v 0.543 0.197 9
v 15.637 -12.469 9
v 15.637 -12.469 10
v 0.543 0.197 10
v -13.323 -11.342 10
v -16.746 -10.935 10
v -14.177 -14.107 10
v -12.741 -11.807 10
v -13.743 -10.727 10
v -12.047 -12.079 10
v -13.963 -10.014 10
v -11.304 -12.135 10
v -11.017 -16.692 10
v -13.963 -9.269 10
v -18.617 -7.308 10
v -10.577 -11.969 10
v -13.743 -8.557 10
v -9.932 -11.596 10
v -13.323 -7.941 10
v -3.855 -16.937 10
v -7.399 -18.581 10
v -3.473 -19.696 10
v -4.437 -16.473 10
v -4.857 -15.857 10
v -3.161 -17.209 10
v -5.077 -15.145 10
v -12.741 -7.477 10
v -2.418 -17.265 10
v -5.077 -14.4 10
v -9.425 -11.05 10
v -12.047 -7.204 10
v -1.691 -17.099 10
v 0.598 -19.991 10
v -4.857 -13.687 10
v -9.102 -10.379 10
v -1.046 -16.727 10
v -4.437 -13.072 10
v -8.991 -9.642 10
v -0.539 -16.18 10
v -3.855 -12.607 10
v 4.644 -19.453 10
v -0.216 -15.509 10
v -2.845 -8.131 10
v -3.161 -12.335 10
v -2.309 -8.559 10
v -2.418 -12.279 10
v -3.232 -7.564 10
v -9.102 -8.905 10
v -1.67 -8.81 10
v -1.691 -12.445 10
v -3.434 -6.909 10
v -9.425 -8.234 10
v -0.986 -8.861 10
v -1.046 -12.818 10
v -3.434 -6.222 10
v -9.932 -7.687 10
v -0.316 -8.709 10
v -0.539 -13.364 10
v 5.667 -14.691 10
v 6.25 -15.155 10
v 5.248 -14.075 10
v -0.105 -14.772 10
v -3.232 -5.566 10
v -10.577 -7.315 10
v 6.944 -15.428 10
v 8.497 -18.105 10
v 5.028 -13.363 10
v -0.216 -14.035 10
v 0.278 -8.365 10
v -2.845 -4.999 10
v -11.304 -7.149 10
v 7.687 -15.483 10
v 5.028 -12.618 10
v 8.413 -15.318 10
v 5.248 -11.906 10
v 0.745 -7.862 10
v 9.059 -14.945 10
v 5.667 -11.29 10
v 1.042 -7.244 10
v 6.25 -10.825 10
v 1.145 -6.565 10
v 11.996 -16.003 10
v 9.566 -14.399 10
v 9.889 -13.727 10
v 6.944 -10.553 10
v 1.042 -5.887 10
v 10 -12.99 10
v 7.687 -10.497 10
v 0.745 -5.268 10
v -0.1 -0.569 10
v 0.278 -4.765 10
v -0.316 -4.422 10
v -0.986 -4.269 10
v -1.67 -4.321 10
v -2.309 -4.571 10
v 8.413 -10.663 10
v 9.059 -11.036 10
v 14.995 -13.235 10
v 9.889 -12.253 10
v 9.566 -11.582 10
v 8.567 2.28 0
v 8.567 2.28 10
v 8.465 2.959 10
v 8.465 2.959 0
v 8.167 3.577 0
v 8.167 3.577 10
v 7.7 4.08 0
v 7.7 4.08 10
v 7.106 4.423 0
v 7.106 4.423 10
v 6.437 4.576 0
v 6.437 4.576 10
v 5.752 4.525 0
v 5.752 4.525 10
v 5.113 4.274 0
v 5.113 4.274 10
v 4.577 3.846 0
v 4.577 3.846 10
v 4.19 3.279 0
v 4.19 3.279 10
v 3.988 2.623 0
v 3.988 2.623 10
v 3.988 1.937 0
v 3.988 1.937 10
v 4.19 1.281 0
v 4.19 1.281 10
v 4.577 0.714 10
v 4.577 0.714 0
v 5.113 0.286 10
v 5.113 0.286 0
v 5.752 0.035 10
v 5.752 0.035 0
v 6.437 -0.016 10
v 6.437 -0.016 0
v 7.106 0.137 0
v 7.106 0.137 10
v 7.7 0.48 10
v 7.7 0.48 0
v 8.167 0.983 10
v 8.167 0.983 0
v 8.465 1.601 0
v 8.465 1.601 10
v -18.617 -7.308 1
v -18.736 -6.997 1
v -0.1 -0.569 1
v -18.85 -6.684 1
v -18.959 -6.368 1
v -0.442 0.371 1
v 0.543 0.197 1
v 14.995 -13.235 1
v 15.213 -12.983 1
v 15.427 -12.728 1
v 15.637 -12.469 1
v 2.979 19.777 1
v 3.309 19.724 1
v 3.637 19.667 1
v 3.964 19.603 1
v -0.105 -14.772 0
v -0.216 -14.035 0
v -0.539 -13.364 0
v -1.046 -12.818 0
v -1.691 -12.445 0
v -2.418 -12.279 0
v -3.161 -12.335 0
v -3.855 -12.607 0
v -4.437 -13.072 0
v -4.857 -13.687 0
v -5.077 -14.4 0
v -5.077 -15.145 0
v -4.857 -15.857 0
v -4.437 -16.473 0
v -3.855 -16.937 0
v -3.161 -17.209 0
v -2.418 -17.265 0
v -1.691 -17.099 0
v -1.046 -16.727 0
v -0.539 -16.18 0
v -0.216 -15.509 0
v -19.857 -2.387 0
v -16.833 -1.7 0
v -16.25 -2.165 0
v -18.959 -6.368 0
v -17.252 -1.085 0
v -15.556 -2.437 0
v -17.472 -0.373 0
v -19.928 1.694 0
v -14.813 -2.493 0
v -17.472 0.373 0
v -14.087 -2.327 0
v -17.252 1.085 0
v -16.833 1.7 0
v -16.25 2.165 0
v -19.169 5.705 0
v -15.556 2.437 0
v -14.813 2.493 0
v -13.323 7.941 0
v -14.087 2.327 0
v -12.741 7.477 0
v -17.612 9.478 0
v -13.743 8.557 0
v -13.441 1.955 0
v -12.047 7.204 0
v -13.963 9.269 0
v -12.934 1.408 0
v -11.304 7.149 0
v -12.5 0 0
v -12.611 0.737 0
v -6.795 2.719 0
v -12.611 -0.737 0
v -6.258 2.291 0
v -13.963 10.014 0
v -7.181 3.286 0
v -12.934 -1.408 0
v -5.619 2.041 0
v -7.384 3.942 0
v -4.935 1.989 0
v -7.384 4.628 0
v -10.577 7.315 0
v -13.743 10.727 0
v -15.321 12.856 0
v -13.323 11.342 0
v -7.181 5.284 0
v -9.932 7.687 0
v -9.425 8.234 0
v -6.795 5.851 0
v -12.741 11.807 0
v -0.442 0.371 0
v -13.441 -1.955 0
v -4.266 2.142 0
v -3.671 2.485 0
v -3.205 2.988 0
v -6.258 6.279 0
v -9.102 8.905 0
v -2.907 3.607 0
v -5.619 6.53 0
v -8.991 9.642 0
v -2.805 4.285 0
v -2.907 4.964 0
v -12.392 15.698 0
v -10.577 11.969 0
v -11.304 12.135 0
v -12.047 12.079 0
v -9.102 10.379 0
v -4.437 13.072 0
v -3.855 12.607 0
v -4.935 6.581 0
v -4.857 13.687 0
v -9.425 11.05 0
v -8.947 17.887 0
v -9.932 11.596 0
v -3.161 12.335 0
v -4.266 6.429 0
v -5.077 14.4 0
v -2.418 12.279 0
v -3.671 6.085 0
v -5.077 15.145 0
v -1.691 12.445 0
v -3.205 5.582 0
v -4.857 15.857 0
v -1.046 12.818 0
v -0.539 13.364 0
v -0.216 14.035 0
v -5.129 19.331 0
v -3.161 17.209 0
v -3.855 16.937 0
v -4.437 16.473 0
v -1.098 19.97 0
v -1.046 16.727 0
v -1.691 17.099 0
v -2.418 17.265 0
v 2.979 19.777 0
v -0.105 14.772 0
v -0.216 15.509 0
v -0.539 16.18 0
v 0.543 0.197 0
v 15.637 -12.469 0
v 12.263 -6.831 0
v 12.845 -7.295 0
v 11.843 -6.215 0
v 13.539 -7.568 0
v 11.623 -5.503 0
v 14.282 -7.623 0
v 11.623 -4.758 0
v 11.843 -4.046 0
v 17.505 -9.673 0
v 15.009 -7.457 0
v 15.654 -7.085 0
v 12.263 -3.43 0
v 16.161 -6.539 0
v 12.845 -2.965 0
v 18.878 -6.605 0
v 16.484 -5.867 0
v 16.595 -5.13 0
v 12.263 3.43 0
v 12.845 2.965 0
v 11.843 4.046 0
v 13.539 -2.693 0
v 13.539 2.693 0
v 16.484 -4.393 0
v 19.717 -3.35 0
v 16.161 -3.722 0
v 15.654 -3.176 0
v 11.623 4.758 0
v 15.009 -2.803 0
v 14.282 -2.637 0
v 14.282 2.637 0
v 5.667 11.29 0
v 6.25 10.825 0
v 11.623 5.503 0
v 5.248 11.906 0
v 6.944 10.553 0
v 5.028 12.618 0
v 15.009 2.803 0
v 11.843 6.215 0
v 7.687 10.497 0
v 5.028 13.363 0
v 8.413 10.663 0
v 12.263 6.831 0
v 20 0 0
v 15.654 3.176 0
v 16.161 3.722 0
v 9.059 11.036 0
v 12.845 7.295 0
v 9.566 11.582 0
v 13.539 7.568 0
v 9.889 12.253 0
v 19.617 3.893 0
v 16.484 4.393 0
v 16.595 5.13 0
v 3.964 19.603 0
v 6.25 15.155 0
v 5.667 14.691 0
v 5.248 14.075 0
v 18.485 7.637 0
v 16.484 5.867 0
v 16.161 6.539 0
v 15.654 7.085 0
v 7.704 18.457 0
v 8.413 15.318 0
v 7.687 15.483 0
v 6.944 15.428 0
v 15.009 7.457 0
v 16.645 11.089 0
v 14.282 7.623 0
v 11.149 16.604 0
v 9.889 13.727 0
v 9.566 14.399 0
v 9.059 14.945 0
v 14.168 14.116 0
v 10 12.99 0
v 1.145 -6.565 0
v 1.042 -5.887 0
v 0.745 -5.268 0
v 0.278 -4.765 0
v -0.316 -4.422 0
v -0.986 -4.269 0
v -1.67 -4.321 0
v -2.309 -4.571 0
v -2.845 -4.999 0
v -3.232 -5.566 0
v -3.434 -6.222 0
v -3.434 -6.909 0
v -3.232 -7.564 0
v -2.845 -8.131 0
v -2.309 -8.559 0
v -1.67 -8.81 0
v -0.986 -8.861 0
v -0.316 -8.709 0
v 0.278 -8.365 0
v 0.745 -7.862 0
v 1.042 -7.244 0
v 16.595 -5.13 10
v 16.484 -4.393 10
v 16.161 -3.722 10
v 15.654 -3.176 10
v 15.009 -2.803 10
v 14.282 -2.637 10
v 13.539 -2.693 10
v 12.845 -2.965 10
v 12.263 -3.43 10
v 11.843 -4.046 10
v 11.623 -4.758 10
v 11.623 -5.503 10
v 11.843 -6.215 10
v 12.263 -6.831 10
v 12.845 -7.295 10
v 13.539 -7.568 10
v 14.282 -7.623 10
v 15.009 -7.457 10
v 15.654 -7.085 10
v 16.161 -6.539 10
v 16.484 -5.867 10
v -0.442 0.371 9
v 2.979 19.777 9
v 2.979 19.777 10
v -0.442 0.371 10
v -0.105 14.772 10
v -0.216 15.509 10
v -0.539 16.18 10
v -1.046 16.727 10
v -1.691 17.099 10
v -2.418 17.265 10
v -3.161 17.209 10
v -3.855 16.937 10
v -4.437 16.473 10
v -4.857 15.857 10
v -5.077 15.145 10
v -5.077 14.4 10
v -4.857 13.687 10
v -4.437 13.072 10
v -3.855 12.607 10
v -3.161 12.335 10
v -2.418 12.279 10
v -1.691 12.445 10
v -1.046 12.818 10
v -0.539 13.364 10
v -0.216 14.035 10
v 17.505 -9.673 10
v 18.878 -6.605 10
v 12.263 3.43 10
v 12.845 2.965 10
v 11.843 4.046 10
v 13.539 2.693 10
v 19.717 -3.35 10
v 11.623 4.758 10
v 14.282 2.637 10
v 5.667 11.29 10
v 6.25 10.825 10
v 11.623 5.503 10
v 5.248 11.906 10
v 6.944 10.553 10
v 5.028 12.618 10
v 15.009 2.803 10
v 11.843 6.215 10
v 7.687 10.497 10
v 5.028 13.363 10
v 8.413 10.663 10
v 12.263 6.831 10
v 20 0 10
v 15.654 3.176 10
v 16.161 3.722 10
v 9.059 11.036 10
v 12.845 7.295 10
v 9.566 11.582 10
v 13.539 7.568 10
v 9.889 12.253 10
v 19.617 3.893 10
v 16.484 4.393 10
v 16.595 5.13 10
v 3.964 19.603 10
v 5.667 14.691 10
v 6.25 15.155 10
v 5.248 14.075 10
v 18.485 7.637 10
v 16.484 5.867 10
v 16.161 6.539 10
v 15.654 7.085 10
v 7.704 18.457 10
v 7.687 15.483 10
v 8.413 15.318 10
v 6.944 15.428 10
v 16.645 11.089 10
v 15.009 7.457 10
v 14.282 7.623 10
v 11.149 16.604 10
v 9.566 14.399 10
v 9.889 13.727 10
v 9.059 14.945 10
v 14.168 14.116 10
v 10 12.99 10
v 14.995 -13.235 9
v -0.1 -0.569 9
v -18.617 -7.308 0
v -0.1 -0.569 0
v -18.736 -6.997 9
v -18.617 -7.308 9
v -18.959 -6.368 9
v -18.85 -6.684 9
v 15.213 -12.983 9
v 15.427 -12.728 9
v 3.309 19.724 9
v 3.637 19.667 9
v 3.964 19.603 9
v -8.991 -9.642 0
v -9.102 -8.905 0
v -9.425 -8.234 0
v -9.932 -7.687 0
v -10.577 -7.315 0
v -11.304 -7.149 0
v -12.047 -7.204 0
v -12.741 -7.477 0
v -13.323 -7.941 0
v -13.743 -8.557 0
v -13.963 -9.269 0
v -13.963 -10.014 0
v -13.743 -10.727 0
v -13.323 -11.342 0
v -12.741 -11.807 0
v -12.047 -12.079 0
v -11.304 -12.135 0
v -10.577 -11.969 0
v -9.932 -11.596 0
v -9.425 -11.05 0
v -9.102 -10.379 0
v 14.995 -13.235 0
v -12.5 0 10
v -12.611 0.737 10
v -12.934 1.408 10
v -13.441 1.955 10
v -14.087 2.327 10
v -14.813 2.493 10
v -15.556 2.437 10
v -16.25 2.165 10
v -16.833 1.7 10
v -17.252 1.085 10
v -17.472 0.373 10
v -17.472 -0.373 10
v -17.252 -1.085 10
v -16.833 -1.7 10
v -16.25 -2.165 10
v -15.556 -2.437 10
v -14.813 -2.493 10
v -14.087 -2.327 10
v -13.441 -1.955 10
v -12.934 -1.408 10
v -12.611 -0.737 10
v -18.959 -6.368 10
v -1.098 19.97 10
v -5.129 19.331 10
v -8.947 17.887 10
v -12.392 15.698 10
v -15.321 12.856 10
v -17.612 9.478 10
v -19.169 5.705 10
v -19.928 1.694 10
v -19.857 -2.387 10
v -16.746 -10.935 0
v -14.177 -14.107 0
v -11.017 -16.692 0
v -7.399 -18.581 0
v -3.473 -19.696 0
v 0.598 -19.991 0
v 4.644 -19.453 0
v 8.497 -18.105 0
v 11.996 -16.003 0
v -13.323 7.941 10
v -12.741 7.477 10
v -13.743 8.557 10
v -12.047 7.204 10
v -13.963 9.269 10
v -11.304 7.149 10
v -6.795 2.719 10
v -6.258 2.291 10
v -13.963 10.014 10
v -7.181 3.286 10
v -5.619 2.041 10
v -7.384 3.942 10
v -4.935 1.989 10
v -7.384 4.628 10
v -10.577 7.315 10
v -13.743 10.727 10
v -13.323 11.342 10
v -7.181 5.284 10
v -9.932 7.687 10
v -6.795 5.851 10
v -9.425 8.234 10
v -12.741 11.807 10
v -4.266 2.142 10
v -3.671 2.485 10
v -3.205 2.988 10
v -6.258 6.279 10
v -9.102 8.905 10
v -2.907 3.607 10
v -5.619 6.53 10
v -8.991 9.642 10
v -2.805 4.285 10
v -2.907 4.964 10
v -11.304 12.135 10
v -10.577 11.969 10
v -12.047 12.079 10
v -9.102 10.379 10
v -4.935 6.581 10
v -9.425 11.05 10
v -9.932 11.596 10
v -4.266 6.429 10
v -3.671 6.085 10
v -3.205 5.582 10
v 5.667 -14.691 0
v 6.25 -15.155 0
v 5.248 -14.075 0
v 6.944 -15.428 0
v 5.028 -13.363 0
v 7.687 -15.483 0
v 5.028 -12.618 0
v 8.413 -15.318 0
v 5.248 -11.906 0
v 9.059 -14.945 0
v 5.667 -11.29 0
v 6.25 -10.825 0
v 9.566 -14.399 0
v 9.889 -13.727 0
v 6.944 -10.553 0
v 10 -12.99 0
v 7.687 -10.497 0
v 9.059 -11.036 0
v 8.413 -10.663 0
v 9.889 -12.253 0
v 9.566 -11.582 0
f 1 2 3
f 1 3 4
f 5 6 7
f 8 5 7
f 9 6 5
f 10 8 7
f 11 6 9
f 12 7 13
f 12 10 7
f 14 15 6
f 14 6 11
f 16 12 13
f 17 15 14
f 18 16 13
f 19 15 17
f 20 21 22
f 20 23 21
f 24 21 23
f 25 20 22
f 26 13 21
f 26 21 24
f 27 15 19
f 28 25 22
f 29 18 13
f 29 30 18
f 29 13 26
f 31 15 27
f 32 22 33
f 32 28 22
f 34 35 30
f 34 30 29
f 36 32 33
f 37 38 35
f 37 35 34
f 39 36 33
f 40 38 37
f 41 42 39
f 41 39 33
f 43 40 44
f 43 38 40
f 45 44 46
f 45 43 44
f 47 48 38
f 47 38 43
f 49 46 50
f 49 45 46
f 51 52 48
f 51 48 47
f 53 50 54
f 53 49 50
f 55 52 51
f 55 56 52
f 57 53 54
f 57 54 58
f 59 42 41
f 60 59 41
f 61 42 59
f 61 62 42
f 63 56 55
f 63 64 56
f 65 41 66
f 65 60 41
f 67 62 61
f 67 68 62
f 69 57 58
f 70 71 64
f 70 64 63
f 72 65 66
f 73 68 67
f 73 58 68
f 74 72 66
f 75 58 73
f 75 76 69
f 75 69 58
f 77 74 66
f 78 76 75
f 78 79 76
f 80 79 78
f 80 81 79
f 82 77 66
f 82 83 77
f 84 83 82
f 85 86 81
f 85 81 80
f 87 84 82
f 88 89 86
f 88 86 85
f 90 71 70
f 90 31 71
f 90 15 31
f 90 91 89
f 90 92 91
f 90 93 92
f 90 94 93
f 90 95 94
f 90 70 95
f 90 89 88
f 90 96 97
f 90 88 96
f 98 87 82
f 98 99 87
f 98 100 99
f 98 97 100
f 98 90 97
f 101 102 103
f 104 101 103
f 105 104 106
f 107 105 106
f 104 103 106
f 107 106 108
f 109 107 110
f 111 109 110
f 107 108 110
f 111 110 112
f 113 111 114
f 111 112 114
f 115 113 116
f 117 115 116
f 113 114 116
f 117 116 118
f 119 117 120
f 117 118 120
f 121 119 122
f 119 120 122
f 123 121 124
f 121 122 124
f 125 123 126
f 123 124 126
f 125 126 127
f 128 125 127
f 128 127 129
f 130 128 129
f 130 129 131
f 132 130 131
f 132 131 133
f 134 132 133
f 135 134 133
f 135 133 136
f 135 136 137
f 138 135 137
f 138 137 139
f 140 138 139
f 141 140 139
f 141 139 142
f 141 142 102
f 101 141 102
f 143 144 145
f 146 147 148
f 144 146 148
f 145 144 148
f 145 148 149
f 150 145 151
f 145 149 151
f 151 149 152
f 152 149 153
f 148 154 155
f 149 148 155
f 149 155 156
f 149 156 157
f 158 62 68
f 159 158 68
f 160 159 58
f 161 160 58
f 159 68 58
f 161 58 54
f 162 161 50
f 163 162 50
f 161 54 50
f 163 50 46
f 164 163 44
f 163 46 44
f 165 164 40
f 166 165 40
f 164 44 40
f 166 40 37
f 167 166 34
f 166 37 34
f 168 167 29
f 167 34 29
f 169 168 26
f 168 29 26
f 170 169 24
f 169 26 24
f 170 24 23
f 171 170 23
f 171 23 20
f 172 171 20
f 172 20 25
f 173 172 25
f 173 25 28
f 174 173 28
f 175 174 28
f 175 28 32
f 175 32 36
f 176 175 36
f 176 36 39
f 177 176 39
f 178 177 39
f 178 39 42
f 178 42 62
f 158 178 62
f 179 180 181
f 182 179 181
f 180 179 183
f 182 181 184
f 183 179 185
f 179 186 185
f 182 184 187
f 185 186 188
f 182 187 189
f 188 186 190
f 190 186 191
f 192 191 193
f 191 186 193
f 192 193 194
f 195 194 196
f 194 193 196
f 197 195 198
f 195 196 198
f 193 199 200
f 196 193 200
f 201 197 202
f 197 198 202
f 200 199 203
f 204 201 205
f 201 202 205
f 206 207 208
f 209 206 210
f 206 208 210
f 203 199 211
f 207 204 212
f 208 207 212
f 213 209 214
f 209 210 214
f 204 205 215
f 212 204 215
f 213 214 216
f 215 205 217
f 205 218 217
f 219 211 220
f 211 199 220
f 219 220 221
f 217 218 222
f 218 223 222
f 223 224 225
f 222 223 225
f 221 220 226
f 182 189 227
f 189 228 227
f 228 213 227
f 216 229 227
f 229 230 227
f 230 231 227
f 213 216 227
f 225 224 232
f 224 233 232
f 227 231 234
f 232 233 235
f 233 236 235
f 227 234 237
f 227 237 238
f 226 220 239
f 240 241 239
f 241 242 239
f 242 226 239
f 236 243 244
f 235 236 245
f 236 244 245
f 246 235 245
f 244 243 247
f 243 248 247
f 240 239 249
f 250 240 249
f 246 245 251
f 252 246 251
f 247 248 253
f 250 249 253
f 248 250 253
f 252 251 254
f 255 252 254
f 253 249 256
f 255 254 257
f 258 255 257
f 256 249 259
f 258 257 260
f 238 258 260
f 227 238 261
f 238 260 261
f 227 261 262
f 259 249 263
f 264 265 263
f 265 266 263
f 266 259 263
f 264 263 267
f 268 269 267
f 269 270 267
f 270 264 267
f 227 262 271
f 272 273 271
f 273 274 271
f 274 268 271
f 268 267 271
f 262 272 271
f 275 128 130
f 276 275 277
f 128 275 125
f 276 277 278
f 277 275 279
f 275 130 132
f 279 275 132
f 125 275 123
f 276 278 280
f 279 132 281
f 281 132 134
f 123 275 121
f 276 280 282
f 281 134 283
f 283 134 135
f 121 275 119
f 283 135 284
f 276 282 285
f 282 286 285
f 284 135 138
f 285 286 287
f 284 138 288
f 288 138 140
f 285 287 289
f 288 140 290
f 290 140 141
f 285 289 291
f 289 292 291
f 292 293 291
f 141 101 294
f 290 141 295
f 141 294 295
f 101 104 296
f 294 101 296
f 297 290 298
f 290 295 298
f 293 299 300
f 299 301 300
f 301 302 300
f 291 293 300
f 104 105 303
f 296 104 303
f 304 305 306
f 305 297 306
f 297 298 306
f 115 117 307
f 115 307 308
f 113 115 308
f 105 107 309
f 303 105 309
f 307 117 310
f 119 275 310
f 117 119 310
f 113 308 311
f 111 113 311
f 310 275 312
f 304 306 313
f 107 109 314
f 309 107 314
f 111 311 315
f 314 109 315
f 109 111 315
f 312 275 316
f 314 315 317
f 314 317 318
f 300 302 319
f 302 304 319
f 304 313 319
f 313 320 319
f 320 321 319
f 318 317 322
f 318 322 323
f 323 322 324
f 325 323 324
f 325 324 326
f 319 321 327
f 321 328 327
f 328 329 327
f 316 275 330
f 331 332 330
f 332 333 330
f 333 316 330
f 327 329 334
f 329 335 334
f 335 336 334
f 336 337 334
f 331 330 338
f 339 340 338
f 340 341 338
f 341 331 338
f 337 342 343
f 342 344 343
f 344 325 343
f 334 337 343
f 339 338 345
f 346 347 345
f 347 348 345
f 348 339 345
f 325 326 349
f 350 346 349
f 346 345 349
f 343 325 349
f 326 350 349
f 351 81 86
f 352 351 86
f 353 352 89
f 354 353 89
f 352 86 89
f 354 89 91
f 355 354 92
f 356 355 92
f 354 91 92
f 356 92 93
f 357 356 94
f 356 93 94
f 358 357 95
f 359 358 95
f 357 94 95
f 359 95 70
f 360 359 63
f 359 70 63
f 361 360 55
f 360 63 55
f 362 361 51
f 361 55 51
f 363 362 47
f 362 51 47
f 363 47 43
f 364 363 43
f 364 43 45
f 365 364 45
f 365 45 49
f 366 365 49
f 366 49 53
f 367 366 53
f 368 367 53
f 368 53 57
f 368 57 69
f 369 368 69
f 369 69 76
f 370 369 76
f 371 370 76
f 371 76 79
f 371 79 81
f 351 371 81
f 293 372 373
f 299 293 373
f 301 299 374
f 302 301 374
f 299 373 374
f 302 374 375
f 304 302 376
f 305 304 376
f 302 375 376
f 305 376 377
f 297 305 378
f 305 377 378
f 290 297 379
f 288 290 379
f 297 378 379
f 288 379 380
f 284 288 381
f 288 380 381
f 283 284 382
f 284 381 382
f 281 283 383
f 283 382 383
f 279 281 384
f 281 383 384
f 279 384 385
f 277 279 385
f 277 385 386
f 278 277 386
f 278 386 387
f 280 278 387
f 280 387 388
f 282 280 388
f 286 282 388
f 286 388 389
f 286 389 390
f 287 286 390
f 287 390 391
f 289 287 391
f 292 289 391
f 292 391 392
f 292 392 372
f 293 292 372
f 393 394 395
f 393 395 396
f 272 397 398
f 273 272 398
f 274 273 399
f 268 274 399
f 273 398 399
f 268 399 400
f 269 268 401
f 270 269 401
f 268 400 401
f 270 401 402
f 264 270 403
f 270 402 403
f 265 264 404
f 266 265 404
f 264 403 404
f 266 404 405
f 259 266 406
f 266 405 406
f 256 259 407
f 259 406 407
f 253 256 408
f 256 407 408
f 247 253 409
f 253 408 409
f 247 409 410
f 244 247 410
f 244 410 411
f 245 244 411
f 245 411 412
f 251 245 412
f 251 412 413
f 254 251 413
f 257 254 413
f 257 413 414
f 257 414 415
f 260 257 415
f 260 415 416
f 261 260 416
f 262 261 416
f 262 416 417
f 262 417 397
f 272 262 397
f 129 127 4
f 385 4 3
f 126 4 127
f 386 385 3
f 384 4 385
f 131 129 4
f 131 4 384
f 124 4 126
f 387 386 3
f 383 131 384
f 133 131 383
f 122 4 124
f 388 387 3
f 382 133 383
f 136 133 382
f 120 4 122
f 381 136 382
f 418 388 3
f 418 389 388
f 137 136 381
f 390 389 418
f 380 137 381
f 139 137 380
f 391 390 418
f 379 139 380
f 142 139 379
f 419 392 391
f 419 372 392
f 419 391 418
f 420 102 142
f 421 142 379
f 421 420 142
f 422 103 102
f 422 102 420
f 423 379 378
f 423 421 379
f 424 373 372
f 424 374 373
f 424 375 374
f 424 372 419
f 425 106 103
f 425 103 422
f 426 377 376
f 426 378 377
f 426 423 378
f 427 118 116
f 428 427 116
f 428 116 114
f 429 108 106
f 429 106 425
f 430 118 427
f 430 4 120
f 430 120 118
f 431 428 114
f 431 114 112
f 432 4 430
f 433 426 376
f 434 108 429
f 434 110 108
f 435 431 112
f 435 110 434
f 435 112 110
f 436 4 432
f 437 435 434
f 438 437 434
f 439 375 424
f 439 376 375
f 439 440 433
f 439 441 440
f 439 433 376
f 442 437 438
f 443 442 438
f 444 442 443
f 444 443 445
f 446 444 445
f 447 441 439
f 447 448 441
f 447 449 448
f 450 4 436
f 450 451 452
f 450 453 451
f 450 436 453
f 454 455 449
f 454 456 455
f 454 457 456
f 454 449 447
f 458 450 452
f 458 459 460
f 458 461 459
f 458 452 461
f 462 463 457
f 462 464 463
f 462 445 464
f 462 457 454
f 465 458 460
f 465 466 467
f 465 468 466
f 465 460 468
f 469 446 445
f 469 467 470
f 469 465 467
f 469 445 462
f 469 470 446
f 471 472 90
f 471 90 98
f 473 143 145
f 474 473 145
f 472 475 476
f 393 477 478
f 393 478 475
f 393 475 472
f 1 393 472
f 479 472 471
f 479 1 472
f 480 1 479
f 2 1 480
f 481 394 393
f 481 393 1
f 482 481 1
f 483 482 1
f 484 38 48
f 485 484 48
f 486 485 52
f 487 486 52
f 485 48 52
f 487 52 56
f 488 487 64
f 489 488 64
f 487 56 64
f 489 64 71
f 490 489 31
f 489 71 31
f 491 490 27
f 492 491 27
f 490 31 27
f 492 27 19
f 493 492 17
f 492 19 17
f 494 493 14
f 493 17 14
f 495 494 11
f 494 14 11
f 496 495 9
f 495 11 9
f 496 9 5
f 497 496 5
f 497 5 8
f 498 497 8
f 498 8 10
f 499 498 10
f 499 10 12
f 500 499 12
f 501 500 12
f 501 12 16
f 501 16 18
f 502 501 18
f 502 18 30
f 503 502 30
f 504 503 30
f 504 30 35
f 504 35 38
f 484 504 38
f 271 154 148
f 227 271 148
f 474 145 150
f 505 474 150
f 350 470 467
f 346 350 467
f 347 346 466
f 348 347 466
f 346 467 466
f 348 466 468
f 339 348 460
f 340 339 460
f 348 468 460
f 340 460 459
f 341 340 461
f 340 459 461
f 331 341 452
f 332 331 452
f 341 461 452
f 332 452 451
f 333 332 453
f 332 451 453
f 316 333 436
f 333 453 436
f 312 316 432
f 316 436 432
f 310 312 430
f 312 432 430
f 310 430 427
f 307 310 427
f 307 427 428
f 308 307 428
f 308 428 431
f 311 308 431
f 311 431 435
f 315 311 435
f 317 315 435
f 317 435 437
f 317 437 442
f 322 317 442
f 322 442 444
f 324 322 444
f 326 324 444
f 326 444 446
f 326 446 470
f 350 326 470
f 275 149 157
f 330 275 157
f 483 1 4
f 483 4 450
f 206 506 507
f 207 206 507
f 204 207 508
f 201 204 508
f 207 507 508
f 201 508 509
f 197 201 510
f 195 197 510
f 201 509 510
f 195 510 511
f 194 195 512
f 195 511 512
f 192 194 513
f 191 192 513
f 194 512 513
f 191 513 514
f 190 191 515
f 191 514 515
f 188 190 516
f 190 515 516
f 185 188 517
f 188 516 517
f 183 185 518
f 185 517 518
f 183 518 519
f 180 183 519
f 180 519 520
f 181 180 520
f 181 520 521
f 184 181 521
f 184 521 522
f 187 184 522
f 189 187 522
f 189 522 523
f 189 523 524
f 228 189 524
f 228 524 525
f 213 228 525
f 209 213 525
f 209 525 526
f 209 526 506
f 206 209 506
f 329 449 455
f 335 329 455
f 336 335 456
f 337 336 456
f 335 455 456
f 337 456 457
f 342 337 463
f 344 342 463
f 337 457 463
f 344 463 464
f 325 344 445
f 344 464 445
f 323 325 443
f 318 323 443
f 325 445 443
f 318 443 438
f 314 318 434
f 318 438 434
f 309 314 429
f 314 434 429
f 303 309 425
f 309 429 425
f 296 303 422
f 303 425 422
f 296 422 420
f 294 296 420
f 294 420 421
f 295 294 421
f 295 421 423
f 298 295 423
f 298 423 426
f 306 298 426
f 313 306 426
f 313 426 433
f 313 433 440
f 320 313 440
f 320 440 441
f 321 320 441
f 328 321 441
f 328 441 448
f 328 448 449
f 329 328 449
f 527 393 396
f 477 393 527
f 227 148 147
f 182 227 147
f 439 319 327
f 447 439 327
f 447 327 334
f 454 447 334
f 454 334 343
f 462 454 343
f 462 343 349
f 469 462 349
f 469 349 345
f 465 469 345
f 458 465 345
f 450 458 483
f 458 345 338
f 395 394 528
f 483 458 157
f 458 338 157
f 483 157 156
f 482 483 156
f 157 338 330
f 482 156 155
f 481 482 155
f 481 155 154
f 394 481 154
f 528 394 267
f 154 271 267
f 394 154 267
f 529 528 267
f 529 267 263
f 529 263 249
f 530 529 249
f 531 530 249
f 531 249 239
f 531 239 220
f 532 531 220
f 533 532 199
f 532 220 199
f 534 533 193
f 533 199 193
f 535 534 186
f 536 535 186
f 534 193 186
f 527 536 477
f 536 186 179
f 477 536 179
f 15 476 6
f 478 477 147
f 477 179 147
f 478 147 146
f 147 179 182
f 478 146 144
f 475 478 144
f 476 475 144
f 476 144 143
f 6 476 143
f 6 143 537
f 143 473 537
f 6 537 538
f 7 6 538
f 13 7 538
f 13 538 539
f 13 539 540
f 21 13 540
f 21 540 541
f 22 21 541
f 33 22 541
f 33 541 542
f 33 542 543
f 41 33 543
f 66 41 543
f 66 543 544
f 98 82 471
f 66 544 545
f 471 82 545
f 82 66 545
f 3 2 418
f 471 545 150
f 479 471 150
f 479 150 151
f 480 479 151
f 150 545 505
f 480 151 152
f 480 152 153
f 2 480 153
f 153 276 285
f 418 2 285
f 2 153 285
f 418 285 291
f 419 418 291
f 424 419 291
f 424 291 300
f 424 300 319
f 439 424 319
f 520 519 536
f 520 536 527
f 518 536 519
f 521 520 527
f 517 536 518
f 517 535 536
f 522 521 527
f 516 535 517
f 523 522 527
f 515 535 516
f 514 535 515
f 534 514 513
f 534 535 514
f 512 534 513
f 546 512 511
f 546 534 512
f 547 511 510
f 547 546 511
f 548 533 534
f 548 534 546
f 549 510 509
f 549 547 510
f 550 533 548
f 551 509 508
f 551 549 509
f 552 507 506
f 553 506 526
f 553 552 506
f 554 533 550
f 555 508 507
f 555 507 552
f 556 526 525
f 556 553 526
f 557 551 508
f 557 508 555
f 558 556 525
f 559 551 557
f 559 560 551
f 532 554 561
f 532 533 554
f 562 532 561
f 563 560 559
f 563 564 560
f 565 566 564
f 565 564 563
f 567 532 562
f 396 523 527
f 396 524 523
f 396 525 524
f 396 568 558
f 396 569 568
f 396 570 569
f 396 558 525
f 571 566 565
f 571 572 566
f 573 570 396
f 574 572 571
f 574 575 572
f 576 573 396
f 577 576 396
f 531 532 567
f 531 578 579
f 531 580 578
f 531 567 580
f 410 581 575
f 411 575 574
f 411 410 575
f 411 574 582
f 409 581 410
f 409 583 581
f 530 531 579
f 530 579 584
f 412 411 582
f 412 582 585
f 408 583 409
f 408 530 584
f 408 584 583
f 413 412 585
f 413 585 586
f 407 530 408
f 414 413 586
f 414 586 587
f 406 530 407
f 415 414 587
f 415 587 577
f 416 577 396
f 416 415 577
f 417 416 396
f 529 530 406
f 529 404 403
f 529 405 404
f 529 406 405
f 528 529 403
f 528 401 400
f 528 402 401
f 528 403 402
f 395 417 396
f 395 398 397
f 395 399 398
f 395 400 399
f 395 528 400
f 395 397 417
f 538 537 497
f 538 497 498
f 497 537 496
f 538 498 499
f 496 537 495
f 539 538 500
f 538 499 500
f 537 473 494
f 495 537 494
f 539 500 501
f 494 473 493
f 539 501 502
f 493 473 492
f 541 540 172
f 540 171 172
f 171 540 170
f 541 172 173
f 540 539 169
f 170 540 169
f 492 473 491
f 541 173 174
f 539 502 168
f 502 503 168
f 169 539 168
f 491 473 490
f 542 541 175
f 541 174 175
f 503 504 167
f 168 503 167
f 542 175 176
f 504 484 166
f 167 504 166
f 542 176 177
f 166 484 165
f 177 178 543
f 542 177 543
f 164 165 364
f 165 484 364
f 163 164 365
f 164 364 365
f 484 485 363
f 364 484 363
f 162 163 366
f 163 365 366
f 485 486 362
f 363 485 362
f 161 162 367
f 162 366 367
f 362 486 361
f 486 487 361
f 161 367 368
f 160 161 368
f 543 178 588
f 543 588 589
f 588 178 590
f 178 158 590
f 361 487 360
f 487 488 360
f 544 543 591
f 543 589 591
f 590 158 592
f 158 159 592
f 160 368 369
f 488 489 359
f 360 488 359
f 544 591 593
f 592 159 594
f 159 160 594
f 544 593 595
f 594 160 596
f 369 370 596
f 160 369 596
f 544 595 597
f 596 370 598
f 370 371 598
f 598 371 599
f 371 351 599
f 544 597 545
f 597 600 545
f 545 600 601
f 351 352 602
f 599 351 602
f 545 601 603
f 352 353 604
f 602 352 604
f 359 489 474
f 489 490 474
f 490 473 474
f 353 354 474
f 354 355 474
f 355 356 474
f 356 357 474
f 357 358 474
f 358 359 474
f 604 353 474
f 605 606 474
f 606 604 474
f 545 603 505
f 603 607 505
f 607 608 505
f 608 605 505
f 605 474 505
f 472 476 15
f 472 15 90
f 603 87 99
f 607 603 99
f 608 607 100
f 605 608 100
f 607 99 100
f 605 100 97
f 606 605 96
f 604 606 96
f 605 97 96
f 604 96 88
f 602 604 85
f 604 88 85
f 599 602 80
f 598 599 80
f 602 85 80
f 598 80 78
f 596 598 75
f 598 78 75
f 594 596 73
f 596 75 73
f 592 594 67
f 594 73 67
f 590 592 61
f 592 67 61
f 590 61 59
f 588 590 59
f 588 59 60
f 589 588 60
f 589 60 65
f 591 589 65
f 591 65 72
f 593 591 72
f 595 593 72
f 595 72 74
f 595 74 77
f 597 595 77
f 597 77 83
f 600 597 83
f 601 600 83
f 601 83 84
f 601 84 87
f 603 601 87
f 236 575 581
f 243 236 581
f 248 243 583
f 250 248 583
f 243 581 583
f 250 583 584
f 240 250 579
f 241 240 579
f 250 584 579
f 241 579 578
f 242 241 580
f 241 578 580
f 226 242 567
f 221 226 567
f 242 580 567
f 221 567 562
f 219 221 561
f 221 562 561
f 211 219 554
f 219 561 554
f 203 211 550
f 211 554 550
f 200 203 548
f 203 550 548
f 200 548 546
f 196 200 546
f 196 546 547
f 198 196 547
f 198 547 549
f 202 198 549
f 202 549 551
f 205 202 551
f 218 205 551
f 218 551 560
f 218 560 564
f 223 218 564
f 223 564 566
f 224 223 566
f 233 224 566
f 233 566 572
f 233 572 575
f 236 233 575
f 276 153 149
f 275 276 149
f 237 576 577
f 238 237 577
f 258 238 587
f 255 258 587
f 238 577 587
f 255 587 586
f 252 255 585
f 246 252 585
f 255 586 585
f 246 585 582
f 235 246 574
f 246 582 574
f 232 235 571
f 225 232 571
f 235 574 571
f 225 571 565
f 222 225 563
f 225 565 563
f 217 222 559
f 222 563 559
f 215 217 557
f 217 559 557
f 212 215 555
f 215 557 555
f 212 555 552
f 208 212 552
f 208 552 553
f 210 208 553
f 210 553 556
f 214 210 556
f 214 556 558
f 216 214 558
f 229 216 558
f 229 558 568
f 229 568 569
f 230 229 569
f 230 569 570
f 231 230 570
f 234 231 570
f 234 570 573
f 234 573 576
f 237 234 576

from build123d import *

# Parameters (mm, degrees)
SKETCH1_R           = 20
BOSS_EXTRUDE1_DEPTH = 10
SKETCH2_R           = 2.5
SKETCH2_R_2         = 2.302418505
CUT_EXTRUDE1_DEPTH  = 35
CUT_EXTRUDE2_START  = -1
CUT_EXTRUDE2_DEPTH  = 1


with BuildPart() as part:
    # Sketch1 → Boss-Extrude1 (new body)
    with BuildSketch(Plane.XY):
        Circle(SKETCH1_R)
    extrude(amount=BOSS_EXTRUDE1_DEPTH)

    # Sketch2 → Cut-Extrude1 (cut)
    with BuildSketch(Plane.XY.offset(10)):
        with Locations((-15, 0)):
            Circle(SKETCH2_R)
        with Locations((-11.490666647, 9.641814145)):
            Circle(SKETCH2_R)
        with Locations((-2.604722665, 14.772116295)):
            Circle(SKETCH2_R)
        with Locations((7.5, 12.990381057)):
            Circle(SKETCH2_R)
        with Locations((14.095389312, 5.13030215)):
            Circle(SKETCH2_R)
        with Locations((14.095389312, -5.13030215)):
            Circle(SKETCH2_R)
        with Locations((7.5, -12.990381057)):
            Circle(SKETCH2_R)
        with Locations((-2.604722665, -14.772116295)):
            Circle(SKETCH2_R)
        with Locations((-11.490666647, -9.641814145)):
            Circle(SKETCH2_R)
        with Locations((-5.106965508, 4.285252874)):
            Circle(SKETCH2_R_2)
        with Locations((6.264620604, 2.280135429)):
            Circle(SKETCH2_R_2)
        with Locations((-1.157655097, -6.565388303)):
            Circle(SKETCH2_R_2)
    extrude(amount=-CUT_EXTRUDE1_DEPTH, mode=Mode.SUBTRACT)

    # Sketch3 → Cut-Extrude2 (cut)
    with BuildSketch(Plane.XY.offset(10).offset(CUT_EXTRUDE2_START)):
        with BuildLine():
            ThreePointArc((-18.958988491, -6.368418596), (-18.793852416, -6.840402867), (-18.616968347, -7.308111217))
            Line((-18.616968347, -7.308111217), (-0.100255822, -0.568579021))
            Line((-0.100255822, -0.568579021), (14.994706531, -13.234756365))
            ThreePointArc((14.994706531, -13.234756365), (15.320888862, -12.855752194), (15.637494141, -12.468711922))
            Line((15.637494141, -12.468711922), (0.542531788, 0.197465422))
            Line((0.542531788, 0.197465422), (3.964281959, 19.603174961))
            ThreePointArc((3.964281959, 19.603174961), (3.472963553, 19.69615506), (2.979474206, 19.776823139))
            Line((2.979474206, 19.776823139), (-0.442275965, 0.371113599))
            Line((-0.442275965, 0.371113599), (-18.958988491, -6.368418596))
        make_face()
    cut_extrude2 = extrude(amount=CUT_EXTRUDE2_DEPTH, mode=Mode.SUBTRACT)

    # Mirror1: Cut-Extrude2 across plane
    add(cut_extrude2.mirror(Plane(origin=(0, 0, 5), x_dir=(1, 0, 0), z_dir=(0, 0, -1))), mode=Mode.SUBTRACT)


solid = part.part
